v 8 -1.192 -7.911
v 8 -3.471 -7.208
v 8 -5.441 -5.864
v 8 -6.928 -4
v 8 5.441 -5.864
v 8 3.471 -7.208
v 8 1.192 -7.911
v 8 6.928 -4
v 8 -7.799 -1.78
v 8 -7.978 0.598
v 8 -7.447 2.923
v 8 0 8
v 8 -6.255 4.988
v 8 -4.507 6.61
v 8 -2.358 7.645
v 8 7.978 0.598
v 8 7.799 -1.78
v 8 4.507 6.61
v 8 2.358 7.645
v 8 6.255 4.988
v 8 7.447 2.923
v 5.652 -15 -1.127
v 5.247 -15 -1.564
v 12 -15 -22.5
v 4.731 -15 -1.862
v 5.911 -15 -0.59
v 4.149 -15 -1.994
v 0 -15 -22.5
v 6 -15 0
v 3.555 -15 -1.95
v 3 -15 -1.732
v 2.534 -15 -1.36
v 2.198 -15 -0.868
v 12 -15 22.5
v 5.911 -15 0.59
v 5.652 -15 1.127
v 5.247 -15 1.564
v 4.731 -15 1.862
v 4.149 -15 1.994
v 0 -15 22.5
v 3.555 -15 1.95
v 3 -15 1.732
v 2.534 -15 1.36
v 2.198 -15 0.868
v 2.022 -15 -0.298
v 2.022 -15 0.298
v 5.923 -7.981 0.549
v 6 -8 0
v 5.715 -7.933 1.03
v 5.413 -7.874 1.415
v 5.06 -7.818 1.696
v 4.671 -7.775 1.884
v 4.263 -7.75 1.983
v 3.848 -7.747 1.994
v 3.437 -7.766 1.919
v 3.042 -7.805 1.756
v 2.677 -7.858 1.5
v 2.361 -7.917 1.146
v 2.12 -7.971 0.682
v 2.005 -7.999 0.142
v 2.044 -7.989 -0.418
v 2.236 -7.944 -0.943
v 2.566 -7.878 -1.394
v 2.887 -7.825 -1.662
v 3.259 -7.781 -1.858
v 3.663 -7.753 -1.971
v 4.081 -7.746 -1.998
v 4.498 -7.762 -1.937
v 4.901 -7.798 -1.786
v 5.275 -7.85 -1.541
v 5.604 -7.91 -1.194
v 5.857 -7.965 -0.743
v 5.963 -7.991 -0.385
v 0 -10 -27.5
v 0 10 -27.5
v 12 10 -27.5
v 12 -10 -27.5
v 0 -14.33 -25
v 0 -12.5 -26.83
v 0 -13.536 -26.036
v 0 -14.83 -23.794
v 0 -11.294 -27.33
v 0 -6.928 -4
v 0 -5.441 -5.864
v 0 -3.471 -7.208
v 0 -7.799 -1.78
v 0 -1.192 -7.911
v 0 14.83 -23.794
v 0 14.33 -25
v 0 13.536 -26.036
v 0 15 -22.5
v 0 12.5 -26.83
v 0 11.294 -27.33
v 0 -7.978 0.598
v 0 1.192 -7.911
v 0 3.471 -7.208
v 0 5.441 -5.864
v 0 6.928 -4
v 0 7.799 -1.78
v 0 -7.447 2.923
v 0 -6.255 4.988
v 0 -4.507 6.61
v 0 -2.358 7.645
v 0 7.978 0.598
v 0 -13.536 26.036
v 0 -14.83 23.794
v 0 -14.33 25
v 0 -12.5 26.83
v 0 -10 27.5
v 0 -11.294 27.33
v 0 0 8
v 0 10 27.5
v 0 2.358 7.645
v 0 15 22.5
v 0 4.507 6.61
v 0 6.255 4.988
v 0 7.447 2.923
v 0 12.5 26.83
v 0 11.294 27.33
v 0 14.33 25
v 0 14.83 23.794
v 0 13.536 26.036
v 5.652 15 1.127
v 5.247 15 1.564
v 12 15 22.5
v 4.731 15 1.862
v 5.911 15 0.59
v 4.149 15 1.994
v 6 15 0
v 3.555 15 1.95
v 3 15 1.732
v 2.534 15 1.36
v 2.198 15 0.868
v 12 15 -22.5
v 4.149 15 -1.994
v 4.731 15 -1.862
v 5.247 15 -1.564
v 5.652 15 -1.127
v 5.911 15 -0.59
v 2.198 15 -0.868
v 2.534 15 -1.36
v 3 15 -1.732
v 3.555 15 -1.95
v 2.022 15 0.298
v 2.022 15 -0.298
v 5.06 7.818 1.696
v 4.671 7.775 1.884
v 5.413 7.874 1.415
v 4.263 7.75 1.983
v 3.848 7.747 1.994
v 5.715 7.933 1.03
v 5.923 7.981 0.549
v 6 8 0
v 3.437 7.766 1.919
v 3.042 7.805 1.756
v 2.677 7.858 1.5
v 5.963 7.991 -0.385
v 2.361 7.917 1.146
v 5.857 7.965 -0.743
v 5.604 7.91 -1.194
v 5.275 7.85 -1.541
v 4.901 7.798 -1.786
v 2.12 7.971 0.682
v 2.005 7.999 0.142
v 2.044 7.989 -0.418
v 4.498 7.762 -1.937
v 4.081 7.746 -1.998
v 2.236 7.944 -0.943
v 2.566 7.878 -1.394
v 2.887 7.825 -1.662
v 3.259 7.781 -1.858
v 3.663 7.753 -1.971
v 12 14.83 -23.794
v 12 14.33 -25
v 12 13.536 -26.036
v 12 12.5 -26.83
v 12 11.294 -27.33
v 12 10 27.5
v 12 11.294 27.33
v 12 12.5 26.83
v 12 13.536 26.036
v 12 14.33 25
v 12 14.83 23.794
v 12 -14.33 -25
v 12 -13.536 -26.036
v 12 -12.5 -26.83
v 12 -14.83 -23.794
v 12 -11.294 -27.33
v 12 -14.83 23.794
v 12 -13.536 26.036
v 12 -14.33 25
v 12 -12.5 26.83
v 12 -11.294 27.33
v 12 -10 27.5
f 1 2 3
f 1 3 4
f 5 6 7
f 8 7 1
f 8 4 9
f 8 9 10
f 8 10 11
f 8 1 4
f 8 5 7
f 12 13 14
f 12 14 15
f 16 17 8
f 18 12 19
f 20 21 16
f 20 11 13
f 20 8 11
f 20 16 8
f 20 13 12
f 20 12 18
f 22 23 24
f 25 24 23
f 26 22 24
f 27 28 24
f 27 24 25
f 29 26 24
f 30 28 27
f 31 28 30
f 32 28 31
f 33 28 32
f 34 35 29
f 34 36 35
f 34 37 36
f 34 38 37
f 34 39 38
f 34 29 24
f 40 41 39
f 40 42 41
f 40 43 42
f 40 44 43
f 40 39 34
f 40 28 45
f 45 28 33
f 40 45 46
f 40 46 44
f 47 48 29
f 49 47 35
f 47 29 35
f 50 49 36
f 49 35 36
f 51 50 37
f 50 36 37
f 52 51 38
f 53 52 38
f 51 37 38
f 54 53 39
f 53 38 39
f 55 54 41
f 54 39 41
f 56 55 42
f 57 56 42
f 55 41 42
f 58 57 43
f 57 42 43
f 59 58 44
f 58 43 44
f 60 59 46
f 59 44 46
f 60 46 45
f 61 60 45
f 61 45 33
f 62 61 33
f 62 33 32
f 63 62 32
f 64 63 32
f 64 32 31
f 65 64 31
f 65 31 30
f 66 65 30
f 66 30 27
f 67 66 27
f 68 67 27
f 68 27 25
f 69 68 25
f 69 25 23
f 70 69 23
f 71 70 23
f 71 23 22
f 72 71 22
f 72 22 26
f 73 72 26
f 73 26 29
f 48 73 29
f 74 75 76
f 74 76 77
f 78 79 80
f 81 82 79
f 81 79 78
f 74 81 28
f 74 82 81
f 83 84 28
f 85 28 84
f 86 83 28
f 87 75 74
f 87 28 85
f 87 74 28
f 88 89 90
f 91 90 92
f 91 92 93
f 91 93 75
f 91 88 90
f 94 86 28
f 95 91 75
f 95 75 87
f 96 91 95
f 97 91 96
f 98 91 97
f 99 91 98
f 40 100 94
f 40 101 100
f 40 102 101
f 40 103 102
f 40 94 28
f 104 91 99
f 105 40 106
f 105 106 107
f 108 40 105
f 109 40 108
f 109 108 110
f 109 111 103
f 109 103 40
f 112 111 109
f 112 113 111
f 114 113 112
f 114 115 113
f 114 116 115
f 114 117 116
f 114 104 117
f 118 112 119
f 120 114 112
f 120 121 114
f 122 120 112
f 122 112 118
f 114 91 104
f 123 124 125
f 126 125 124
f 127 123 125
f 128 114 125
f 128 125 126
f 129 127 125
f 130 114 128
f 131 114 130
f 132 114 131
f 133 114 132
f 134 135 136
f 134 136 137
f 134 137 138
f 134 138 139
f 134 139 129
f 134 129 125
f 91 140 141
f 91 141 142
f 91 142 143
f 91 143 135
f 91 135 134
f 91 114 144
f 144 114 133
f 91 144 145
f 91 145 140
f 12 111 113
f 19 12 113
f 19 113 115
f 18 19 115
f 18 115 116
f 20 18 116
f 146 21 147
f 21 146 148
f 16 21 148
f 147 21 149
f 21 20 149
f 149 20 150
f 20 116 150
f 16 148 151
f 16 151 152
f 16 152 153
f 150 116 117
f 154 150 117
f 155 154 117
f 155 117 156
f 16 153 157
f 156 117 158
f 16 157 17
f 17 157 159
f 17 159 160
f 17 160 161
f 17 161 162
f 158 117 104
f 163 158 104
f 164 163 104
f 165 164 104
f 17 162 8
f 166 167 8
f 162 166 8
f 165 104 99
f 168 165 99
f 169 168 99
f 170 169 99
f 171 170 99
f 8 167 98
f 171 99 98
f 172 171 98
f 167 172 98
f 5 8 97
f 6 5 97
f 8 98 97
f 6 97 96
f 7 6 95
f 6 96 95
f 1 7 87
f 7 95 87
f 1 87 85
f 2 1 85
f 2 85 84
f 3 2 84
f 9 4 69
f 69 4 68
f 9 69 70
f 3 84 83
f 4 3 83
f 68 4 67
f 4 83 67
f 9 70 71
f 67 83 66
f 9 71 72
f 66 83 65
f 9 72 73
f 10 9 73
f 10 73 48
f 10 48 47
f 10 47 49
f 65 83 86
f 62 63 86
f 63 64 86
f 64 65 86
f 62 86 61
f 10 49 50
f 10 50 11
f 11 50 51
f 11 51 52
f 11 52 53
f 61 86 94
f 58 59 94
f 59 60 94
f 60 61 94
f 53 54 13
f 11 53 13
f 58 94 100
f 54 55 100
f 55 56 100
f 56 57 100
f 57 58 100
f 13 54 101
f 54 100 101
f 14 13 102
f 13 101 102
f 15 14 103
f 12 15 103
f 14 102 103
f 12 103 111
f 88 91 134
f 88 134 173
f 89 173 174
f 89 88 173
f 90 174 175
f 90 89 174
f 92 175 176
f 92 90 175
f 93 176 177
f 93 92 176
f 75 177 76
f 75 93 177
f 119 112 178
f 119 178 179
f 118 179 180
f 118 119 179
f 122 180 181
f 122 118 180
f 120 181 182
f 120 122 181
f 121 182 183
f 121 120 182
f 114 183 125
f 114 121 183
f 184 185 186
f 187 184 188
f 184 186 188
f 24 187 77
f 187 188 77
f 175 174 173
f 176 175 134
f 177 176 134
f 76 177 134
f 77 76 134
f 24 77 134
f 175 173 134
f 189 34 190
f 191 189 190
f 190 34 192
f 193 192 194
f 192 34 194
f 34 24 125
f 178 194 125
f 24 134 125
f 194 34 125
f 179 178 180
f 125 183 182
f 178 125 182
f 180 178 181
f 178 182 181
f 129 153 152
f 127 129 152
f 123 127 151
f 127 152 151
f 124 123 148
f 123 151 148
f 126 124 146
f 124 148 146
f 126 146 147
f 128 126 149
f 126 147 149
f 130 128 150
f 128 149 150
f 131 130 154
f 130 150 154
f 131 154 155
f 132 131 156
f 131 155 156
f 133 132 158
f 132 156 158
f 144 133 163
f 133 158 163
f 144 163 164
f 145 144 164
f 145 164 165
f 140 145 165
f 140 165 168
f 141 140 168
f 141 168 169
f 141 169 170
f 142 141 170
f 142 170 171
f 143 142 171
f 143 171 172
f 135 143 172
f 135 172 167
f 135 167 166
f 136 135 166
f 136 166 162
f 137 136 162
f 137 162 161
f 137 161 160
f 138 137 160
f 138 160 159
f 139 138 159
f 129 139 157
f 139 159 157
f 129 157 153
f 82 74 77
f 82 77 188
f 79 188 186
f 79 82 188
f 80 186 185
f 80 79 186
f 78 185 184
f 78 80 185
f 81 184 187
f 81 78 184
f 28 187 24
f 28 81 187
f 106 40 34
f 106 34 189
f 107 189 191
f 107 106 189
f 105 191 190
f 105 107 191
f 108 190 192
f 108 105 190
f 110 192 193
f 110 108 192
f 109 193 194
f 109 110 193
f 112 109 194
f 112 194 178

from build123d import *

# Parameters (mm, degrees)
EXTRUDE_1_DEPTH     = 12
SKETCH_2_R          = 8
CUT_EXTRUDE_1_DEPTH = 8
SKETCH_3_R          = 2
CUT_EXTRUDE_2_DEPTH = 40


with BuildPart() as part:
    # 草图1 → 凸台-拉伸1 (new body)
    with BuildSketch(Plane(origin=(0, 0, 0), x_dir=(0, 0, -1), z_dir=(1, 0, 0))):
        with BuildLine():
            Line((-22.5, 15), (22.5, 15))
            ThreePointArc((22.5, 15), (26.035533906, 13.535533906), (27.5, 10))
            Line((27.5, 10), (27.5, -10))
            ThreePointArc((27.5, -10), (26.035533906, -13.535533906), (22.5, -15))
            Line((22.5, -15), (-22.5, -15))
            ThreePointArc((-22.5, -15), (-26.035533906, -13.535533906), (-27.5, -10))
            Line((-27.5, -10), (-27.5, 10))
            ThreePointArc((-27.5, 10), (-26.035533906, 13.535533906), (-22.5, 15))
        make_face()
    extrude(amount=EXTRUDE_1_DEPTH)

    # 草图2 → 切除-拉伸1 (cut)
    with BuildSketch(Plane.ZY):
        Circle(SKETCH_2_R)
    extrude(amount=-CUT_EXTRUDE_1_DEPTH, mode=Mode.SUBTRACT)

    # 草图3 → 切除-拉伸2 (cut)
    with BuildSketch(Plane.XZ.offset(15)):
        with Locations((4, 0)):
            Circle(SKETCH_3_R)
    extrude(amount=-CUT_EXTRUDE_2_DEPTH, mode=Mode.SUBTRACT)


solid = part.part
